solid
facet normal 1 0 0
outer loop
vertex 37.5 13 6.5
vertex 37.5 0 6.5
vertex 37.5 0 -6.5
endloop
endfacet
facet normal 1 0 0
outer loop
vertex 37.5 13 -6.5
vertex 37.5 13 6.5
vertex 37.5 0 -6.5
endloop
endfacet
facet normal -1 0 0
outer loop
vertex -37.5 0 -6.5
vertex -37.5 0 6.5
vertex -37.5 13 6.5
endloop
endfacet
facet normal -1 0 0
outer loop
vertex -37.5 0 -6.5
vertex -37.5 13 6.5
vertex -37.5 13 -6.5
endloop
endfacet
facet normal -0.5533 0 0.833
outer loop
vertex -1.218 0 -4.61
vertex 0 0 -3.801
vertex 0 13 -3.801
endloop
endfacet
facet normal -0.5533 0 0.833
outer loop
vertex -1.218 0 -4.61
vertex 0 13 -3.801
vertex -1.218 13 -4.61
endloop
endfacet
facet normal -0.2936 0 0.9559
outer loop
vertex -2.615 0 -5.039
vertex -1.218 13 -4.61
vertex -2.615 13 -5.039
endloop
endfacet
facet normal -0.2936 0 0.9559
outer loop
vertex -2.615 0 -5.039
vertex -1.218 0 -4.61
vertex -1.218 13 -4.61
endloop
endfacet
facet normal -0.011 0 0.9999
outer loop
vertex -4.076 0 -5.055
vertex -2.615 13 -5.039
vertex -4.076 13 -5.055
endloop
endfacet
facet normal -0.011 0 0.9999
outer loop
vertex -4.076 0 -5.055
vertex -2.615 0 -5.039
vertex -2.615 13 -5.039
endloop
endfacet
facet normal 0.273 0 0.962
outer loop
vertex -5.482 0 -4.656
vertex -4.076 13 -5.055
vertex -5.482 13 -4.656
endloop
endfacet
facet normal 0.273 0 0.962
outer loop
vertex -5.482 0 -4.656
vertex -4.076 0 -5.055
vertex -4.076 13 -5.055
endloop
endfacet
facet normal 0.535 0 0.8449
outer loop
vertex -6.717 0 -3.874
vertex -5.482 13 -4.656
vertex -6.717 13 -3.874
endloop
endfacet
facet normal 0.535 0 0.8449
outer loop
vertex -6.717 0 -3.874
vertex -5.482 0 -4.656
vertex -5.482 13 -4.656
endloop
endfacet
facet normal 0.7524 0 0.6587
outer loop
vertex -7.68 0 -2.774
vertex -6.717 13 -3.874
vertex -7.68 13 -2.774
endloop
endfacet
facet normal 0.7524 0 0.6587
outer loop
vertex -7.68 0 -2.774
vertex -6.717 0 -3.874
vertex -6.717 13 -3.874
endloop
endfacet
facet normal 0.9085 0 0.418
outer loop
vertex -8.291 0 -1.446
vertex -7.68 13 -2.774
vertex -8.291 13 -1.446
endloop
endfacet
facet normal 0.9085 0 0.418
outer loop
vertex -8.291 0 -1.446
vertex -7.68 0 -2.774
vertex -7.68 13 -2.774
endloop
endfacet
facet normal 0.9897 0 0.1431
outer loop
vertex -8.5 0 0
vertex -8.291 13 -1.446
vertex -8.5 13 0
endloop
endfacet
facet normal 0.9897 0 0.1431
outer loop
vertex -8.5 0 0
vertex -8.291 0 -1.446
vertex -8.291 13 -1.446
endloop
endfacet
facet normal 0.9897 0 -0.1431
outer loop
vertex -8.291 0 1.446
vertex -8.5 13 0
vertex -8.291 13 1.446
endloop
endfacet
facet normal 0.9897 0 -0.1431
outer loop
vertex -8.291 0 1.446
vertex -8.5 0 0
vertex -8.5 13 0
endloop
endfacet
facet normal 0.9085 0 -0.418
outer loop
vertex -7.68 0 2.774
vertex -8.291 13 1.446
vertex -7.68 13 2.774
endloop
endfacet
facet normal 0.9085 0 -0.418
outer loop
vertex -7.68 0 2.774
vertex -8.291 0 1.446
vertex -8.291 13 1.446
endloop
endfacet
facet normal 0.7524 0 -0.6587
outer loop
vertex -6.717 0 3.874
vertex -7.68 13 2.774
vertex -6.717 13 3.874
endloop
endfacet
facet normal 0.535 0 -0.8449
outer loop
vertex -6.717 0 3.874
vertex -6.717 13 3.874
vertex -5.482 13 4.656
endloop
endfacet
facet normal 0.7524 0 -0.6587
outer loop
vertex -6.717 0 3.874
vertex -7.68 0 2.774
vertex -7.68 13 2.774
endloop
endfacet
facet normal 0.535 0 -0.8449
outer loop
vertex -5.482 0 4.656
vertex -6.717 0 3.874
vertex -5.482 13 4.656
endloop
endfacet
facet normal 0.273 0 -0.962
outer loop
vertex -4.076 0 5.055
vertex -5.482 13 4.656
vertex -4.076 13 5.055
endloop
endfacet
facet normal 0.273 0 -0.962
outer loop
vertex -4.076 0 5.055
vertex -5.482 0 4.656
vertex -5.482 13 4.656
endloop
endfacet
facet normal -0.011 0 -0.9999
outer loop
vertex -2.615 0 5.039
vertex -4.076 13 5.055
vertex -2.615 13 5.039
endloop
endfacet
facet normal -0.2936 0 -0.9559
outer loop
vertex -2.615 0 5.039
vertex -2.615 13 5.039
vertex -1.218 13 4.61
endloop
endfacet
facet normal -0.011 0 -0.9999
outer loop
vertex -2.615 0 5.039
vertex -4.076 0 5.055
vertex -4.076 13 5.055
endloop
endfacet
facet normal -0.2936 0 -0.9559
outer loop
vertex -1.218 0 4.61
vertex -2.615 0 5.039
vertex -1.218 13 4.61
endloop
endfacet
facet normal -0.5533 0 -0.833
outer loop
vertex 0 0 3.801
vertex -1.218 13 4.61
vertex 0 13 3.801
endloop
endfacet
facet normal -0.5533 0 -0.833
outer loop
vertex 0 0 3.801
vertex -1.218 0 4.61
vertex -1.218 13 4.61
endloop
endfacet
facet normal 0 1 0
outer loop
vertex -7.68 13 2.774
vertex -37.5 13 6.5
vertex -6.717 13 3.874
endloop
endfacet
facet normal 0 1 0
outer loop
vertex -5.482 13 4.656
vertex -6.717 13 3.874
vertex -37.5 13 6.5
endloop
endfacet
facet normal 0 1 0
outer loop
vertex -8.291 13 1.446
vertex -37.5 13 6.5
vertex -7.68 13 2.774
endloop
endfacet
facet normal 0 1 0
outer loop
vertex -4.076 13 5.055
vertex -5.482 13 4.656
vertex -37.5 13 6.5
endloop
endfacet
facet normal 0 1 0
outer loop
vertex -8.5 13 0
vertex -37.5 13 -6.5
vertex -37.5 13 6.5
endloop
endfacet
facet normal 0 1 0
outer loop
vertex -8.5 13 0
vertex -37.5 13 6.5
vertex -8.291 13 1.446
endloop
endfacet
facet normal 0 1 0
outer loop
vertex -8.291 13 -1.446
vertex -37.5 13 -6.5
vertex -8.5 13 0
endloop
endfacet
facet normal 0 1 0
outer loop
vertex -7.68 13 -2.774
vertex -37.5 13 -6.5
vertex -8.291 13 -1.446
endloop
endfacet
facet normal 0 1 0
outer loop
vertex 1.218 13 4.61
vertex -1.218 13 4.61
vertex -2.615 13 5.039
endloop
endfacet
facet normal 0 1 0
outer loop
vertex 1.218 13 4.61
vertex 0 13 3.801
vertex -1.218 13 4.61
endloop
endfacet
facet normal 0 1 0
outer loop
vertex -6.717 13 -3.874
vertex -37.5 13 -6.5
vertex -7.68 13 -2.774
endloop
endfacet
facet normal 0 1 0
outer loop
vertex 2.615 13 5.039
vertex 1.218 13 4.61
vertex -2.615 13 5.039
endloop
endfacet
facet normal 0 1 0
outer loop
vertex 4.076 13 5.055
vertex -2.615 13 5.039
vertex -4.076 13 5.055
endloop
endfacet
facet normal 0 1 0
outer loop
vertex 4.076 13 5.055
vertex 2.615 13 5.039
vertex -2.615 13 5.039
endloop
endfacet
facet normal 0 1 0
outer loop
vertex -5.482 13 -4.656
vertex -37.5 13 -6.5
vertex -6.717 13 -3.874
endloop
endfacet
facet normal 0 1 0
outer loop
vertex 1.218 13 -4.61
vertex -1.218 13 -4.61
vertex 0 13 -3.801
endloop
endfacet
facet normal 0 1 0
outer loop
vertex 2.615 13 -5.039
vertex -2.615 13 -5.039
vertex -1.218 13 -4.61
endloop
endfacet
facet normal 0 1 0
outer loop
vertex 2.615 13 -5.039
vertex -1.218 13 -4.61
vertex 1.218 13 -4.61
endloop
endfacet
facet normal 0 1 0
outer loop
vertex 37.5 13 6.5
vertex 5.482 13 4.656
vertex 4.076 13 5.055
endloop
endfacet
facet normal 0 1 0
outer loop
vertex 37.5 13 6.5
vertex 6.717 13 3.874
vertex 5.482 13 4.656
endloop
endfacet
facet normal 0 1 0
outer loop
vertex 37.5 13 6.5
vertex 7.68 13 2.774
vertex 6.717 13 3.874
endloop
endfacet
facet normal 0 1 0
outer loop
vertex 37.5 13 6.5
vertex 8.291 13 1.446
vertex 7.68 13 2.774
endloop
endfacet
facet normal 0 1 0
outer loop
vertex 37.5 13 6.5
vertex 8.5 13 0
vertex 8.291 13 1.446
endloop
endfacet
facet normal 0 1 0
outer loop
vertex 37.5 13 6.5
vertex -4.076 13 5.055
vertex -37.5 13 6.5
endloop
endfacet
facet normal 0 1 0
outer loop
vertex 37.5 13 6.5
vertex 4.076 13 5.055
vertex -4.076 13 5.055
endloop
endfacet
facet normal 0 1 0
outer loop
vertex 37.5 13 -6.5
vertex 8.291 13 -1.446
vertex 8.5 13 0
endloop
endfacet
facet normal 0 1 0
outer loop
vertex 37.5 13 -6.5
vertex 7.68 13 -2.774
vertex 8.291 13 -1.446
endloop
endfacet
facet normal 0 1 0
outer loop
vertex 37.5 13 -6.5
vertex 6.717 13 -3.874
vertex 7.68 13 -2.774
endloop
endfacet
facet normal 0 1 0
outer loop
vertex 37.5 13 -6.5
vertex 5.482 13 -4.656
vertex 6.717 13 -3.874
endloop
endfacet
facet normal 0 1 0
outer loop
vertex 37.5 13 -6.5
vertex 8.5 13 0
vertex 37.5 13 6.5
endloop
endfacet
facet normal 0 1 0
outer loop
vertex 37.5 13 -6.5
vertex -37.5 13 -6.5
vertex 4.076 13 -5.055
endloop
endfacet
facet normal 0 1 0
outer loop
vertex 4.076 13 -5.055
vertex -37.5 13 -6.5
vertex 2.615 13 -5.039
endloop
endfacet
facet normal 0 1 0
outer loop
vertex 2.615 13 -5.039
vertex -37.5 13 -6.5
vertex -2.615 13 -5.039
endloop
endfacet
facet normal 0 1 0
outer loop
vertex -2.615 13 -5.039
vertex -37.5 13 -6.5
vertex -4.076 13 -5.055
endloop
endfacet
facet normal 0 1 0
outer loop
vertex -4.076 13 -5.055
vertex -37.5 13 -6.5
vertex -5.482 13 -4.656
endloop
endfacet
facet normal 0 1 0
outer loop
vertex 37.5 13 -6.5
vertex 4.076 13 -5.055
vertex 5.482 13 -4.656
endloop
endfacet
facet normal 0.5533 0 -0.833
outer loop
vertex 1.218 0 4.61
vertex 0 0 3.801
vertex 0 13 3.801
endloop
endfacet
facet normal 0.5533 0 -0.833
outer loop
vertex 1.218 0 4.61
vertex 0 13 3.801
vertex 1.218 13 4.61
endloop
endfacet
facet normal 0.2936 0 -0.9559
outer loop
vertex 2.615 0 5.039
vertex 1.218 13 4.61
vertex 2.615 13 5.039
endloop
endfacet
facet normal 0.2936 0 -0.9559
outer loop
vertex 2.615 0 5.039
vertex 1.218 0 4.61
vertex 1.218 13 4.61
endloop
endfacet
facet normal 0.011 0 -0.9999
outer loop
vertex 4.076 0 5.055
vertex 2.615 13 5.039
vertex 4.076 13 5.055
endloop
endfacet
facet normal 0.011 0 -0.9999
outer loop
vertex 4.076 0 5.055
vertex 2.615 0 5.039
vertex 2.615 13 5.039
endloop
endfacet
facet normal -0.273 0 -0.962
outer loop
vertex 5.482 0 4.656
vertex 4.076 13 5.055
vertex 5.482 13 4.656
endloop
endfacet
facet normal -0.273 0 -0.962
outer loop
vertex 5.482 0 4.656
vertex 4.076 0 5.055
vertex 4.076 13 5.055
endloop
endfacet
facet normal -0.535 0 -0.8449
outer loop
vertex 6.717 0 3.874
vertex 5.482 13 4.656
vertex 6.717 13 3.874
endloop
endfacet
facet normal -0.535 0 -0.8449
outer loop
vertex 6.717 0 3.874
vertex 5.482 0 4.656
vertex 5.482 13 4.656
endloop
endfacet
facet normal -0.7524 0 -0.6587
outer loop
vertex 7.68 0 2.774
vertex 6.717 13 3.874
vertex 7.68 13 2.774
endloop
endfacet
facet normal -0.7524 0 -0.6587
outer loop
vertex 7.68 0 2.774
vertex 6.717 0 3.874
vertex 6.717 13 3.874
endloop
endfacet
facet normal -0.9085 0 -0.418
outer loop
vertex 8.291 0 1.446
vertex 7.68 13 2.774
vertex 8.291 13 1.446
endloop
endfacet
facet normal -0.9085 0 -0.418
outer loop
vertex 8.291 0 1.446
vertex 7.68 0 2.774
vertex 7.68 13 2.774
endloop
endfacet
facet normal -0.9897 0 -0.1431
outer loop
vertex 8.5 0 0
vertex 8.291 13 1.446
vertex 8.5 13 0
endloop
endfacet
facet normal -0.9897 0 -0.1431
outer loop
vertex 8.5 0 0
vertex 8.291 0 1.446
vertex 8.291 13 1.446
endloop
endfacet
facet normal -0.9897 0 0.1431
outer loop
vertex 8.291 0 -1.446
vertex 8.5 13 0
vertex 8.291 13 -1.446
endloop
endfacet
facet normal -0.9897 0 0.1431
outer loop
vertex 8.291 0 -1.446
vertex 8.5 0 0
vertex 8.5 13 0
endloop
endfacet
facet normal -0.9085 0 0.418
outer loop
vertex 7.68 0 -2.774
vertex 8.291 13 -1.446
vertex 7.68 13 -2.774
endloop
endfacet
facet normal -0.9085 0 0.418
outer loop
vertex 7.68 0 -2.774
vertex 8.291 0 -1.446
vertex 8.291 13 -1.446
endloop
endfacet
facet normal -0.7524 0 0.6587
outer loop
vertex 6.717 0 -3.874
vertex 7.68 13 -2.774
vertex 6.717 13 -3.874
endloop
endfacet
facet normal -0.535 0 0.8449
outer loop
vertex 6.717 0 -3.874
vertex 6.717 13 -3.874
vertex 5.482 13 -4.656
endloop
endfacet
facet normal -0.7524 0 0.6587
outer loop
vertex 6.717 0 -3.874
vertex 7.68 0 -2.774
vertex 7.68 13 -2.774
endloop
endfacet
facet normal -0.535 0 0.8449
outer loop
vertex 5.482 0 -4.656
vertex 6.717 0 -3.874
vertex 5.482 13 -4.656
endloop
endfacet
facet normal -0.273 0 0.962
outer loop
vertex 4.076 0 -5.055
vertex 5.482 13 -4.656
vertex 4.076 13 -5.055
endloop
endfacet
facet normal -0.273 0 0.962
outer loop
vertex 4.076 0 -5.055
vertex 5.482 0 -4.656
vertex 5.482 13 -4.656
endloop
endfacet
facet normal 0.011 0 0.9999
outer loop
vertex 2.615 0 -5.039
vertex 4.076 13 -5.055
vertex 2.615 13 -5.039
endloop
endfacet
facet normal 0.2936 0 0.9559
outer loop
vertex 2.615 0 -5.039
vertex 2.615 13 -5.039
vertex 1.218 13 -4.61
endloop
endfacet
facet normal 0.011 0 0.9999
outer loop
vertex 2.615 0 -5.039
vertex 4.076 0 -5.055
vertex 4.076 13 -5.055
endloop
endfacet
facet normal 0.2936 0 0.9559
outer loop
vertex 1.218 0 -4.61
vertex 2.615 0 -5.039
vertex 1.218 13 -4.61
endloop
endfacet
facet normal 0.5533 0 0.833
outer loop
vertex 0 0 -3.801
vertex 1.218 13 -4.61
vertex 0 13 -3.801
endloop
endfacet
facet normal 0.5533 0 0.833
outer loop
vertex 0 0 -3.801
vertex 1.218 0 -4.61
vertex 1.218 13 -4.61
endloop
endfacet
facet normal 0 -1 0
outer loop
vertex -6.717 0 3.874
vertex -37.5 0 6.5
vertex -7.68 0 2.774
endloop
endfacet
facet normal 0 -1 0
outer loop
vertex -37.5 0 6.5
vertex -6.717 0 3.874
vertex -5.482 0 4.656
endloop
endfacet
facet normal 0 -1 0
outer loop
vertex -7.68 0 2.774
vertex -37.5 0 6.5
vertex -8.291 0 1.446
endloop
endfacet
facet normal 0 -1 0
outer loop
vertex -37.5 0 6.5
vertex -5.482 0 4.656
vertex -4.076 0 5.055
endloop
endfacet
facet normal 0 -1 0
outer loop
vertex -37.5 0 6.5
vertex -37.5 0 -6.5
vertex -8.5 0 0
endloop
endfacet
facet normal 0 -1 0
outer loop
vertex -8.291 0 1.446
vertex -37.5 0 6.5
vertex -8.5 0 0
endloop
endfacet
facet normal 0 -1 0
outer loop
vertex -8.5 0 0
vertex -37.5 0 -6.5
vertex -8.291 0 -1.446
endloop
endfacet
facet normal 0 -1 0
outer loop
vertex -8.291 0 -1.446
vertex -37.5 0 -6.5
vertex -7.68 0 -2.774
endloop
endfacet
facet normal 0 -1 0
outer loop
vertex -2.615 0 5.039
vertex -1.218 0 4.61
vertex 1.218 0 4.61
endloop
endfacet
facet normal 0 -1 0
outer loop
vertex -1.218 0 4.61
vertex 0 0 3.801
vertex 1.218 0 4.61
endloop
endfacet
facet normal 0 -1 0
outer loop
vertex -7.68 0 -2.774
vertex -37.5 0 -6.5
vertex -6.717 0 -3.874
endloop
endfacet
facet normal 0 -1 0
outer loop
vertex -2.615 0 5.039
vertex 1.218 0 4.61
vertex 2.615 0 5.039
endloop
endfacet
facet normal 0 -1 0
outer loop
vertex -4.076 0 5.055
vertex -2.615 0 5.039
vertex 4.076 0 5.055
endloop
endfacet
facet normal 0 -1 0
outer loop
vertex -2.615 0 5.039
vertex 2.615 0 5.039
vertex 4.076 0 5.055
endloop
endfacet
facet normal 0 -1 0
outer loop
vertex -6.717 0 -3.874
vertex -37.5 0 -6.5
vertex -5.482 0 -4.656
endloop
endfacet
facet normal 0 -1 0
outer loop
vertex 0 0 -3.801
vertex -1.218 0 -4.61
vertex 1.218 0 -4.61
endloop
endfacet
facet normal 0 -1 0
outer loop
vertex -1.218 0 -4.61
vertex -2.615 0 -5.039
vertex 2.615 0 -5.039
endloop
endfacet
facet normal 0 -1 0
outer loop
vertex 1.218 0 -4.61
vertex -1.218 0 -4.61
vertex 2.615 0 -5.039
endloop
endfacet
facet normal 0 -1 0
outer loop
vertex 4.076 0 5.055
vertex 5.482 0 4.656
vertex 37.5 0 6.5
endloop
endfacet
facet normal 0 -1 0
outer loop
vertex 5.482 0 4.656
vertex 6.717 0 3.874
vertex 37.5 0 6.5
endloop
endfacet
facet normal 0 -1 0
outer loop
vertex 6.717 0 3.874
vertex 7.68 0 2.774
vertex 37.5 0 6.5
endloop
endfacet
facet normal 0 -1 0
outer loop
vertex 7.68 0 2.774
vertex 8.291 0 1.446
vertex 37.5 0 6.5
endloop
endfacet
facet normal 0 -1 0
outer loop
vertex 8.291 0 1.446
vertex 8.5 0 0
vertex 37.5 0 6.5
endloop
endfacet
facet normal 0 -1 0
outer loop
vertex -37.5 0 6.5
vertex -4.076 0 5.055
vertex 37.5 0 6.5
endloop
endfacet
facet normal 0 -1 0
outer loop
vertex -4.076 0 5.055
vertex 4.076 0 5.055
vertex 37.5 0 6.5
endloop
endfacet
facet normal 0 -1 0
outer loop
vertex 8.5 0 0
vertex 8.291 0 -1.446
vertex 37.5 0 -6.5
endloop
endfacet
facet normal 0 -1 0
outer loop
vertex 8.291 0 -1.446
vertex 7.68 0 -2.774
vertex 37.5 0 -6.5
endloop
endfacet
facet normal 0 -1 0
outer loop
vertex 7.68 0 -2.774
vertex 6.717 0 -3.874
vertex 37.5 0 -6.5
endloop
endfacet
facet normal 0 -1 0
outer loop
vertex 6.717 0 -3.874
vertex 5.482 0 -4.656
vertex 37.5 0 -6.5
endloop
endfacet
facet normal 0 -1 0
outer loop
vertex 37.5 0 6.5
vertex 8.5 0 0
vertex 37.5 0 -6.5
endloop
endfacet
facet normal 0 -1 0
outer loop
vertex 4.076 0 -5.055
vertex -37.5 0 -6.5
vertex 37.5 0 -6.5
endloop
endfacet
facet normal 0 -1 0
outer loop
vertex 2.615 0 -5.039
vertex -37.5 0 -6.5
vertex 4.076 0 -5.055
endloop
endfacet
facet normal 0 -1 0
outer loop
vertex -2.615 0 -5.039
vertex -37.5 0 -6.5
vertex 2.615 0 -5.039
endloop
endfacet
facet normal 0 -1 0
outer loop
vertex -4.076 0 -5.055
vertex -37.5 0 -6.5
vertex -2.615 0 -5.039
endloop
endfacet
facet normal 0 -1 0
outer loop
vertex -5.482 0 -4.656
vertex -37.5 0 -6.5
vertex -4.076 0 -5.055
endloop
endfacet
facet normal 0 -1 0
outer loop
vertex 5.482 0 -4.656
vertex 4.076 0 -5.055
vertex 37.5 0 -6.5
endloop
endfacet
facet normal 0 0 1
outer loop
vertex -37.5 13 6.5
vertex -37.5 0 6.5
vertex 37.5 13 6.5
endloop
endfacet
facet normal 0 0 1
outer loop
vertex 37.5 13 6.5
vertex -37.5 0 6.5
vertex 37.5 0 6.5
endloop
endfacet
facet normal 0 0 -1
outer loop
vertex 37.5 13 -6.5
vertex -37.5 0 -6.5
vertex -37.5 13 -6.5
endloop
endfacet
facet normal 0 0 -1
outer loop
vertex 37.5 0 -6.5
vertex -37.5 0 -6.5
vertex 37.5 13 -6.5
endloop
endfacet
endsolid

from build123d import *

# Parameters (mm, degrees)
SKETCH1_W           = 75
SKETCH1_H           = 13
BOSS_EXTRUDE1_DEPTH = 13


with BuildPart() as part:
    # Sketch1 → Boss-Extrude1 (new body)
    with BuildSketch(Plane(origin=(0, 0, 0), x_dir=(1, 0, 0), z_dir=(0, 1, 0))):
        Rectangle(SKETCH1_W, SKETCH1_H)
        with BuildLine():
            ThreePointArc((0, 3.801315562), (-8.5, 0), (0, -3.801315562))
            ThreePointArc((0, -3.801315562), (8.5, 0), (0, 3.801315562))
        make_face(mode=Mode.SUBTRACT)
    extrude(amount=BOSS_EXTRUDE1_DEPTH)


solid = part.part
